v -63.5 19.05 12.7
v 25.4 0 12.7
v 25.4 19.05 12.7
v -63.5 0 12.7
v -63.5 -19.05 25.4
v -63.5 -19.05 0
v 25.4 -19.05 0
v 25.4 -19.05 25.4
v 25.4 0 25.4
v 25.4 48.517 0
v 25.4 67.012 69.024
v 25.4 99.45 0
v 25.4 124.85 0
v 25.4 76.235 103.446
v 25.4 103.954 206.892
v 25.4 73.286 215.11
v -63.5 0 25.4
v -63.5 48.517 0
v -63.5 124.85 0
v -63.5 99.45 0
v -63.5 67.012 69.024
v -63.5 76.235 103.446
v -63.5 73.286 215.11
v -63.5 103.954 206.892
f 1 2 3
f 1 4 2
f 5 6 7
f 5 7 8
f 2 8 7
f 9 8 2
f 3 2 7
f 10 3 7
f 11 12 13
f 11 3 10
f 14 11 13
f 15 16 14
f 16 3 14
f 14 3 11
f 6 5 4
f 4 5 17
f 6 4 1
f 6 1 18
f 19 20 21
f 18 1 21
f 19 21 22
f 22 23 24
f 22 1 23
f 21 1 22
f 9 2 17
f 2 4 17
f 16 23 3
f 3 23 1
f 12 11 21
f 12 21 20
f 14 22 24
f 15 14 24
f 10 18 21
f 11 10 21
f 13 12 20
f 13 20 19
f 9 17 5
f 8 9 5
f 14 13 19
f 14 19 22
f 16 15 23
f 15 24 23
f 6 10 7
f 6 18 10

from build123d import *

# Parameters (mm, degrees)
F0_W     = 63.5
F0_H     = 25.4
F1_DEPTH = 19.05
F2_W     = 19.05
F2_H     = 12.7
F3_DEPTH = 63.5
F4_DEPTH = 25.4
F6_DEPTH = 88.9


with BuildPart() as f1:
    # F0 (on Front) → F1 (new body)
    with BuildSketch(Plane.XZ):
        with Locations((-31.75, 12.7)):
            Rectangle(F0_W, F0_H)
    extrude(amount=F1_DEPTH)

    # F2 (on Right) → F3 (join)
    with BuildSketch(Plane.YZ):
        with Locations((9.525, 6.35)):
            Rectangle(F2_W, F2_H)
        Polygon((19.05, 12.7), (19.05, 0), (48.5170639841, 0), (103.9536758859, 206.8922522169), (73.2855309012, 215.1097568989), align=None)
    extrude(amount=-F3_DEPTH)

    # F4 (add): a face of the model
    f4_faces = [f1.faces().sort_by_distance(p)[0] for p in [
        (0, 54.342102556, 96.7816110537),
    ]]
    extrude(f4_faces, amount=F4_DEPTH)

    # F5 (on face) → F6 (join)
    with BuildSketch(Plane.YZ.offset(25.4)):
        Polygon((124.8500692878, 0), (76.235369935, 103.4461261084), (67.012033734, 69.0241667908), (99.4500692878, 0), align=None)
    extrude(amount=-F6_DEPTH)


solid = f1.part
